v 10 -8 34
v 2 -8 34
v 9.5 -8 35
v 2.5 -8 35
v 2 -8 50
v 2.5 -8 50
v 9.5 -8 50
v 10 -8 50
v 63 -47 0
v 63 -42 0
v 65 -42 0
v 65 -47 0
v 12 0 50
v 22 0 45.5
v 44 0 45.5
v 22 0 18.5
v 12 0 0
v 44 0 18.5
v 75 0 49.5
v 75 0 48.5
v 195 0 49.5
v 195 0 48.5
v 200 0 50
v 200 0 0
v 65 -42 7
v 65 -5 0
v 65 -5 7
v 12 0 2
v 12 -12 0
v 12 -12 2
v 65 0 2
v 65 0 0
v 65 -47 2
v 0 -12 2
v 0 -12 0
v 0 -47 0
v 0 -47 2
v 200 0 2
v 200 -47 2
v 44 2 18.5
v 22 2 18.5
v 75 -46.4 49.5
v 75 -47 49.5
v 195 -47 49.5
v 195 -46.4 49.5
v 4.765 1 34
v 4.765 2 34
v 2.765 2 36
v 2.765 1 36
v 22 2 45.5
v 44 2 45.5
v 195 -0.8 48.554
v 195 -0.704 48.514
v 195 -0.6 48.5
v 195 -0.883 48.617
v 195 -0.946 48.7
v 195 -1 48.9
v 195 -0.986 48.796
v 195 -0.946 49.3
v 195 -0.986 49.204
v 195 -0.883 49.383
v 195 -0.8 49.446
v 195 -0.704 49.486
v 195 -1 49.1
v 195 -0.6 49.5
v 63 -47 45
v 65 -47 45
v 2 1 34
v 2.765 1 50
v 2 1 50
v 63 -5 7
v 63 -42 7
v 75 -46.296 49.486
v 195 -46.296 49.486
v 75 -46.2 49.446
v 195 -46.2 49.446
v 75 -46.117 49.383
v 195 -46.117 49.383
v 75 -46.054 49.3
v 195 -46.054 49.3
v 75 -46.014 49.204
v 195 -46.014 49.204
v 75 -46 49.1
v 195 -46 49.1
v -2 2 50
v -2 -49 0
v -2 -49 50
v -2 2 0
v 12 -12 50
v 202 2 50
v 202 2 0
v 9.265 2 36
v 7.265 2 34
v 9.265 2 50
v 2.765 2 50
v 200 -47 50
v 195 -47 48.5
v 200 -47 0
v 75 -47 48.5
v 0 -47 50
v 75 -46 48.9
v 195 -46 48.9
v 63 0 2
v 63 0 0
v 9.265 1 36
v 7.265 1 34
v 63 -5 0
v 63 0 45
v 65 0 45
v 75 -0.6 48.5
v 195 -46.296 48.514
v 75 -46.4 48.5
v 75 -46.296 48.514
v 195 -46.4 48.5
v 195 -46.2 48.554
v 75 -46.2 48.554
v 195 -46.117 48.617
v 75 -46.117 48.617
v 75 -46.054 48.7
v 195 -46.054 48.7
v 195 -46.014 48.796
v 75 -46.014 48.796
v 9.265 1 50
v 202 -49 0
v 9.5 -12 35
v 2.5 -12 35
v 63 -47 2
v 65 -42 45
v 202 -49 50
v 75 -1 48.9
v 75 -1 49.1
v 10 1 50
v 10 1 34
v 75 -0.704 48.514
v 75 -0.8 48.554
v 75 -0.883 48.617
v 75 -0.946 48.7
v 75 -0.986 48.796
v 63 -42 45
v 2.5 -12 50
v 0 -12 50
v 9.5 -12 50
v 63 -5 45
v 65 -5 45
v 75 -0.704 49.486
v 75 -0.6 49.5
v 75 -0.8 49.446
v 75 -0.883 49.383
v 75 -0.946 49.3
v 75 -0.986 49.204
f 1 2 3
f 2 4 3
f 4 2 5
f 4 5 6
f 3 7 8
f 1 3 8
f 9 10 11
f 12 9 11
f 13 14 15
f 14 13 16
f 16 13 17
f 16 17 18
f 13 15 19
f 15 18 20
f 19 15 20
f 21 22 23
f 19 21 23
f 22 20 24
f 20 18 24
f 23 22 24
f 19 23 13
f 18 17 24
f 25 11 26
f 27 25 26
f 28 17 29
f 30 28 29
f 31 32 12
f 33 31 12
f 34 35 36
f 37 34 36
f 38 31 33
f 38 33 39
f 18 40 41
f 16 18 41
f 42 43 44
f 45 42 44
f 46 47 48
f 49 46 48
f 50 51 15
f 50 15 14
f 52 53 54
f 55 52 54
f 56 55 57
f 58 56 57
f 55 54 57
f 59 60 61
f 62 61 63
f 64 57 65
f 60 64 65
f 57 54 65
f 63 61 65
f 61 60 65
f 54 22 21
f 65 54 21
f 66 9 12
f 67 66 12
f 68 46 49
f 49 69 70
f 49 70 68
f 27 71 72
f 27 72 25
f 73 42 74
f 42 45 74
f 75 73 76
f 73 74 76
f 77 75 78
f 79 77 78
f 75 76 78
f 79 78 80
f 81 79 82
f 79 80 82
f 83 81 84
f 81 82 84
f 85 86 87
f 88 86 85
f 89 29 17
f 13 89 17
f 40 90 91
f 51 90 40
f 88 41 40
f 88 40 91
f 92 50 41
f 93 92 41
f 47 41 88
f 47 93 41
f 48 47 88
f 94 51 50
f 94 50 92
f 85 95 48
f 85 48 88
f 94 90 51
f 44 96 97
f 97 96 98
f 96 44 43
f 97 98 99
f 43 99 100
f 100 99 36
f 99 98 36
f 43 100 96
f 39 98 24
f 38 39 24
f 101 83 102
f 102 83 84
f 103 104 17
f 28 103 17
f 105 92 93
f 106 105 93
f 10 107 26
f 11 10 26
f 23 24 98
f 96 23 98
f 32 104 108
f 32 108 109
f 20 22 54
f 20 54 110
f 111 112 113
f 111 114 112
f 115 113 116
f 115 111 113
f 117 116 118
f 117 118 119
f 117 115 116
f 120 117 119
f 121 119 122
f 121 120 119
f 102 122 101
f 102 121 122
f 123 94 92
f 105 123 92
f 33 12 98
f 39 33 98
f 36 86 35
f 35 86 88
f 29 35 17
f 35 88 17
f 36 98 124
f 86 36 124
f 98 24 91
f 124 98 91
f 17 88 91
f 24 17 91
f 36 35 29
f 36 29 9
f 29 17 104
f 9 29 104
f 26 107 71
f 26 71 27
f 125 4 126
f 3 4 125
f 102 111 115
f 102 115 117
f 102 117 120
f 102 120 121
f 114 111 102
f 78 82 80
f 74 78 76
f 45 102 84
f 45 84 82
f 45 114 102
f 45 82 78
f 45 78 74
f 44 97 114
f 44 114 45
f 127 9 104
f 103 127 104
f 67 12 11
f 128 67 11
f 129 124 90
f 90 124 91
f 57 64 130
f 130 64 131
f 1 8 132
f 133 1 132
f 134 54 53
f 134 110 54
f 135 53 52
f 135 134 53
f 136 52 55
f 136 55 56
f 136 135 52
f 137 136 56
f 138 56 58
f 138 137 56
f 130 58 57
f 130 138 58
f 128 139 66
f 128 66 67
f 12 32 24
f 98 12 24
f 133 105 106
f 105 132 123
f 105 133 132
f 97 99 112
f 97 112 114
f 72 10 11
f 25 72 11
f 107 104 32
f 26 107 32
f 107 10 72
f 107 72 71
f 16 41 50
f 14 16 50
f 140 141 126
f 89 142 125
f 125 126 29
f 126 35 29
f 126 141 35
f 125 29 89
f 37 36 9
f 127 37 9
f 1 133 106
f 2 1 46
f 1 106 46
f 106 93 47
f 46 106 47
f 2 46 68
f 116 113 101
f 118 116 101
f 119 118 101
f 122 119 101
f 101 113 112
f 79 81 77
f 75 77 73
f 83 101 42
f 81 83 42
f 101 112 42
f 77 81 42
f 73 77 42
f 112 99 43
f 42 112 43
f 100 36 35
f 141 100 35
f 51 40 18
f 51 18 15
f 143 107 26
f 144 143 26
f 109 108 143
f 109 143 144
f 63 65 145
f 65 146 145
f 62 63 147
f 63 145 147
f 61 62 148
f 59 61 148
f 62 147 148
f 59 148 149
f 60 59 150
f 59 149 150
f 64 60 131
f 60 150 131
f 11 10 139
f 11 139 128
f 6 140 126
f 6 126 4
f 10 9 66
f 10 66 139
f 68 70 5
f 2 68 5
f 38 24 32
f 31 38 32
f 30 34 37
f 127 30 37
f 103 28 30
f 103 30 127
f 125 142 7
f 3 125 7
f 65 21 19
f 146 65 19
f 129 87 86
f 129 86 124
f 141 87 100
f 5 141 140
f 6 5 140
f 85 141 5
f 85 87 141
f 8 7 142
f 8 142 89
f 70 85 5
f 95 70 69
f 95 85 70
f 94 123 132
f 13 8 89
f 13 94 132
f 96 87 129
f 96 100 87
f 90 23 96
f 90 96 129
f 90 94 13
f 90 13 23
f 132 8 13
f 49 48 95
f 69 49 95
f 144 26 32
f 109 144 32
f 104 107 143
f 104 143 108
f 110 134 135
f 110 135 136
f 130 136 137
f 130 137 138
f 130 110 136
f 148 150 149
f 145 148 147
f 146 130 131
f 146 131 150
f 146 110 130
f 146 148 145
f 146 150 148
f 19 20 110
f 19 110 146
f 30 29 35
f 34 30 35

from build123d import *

# Parameters (mm, degrees)
F1_DEPTH  = 2
F0_W      = 204
F0_H      = 51
F0_W_2    = 12
F0_H_2    = 12
F2_DEPTH  = 50
F0_W_3    = 2
F0_H_3    = 37
F3_DEPTH  = 7
F0_H_4    = 5
F4_DEPTH  = 45
F6_DEPTH  = 16
F5_W      = 7
F5_H      = 4
F7_DEPTH  = 15
F8_W      = 22
F8_H      = 27
F9_DEPTH  = 5
F10_W     = 120
F10_H     = 1
F11_DEPTH = 3
F12_W     = 120
F12_H     = 1
F13_DEPTH = 3
F14_R     = 0.4


# Not quite as in the source:
# - a feature names something its author has since deleted; it is built from what else it names


with BuildPart() as f1:
    # F0 (on Top) → F1 (new body)
    with BuildSketch(Plane.XY):
        Polygon((200, 0), (65, 0), (65, -5), (65, -42), (65, -47), (200, -47), align=None)
    extrude(amount=F1_DEPTH)


with BuildPart() as f1b:
    # F0 (on Top) → F1, piece 2 (new body)
    with BuildSketch(Plane.XY):
        Polygon((63, 0), (12, 0), (12, -12), (0, -12), (0, -47), (63, -47), (63, -42), (63, -5), align=None)
    extrude(amount=F1_DEPTH)


with BuildPart() as f2:
    # F0 (on Top) → F2 (new body)
    with BuildSketch(Plane.XY):
        with Locations((100, -23.5)):
            Rectangle(F0_W, F0_H)
        Polygon((0, -12), (0, 0), (12, 0), (63, 0), (65, 0), (200, 0), (200, -47), (65, -47), (63, -47), (0, -47), align=None, mode=Mode.SUBTRACT)
        with Locations((6, -6)):
            Rectangle(F0_W_2, F0_H_2)
    extrude(amount=F2_DEPTH)

    # F5 (on face) → F6 (cut)
    with BuildSketch(Plane.XY.offset(50)):
        Polygon((9.25, 1), (2.75, 1), (2, 1), (2, -8), (2.5, -8), (9.5, -8), (10, -8), (10, 1), align=None)
    extrude(amount=-F6_DEPTH, mode=Mode.SUBTRACT)

    # F5 (on face) → F7 (cut)
    with BuildSketch(Plane.XY.offset(50)):
        with Locations((6, -10)):
            Rectangle(F5_W, F5_H)
    extrude(amount=-F7_DEPTH, mode=Mode.SUBTRACT)

    # F8 (on face) → F9 (cut)
    with BuildSketch(Plane(origin=(0, 2, 0), x_dir=(-1, 0, 0), z_dir=(0, 1, 0))):
        Polygon((-7.265019957, 34), (-4.765019957, 34), (-2.765019957, 36), (-2.765019957, 50), (-9.265019957, 50), (-9.265019957, 36), align=None)
        with Locations((-33, 32)):
            Rectangle(F8_W, F8_H)
    extrude(amount=-F9_DEPTH, mode=Mode.SUBTRACT)

    # F10 (on face) → F11 (join)
    with BuildSketch(Plane.XZ.offset(49)):
        with Locations((135, 49)):
            Rectangle(F10_W, F10_H)
    extrude(amount=-F11_DEPTH)

    # F12 (on face) → F13 (join)
    with BuildSketch(Plane(origin=(0, 2, 0), x_dir=(-1, 0, 0), z_dir=(0, 1, 0))):
        with Locations((-135, 49)):
            Rectangle(F12_W, F12_H)
    extrude(amount=-F13_DEPTH)

    # F14
    f14_edges = [f2.edges().sort_by_distance(p)[0] for p in [
        (135, -46, 48.5),
        (135, -46, 49.5),
        (135, -1, 49.5),
        (135, -1, 48.5),
    ]]
    fillet(f14_edges, radius=F14_R)


with BuildPart() as f3:
    # F0 (on Top) → F3 (new body)
    with BuildSketch(Plane.XY):
        with Locations((64, -23.5)):
            Rectangle(F0_W_3, F0_H_3)
    extrude(amount=F3_DEPTH)


with BuildPart() as f4:
    # F0 (on Top) → F4 (new body)
    with BuildSketch(Plane.XY):
        with Locations((64, -44.5)):
            Rectangle(F0_W_3, F0_H_4)
    extrude(amount=F4_DEPTH)


with BuildPart() as f4b:
    # F0 (on Top) → F4, piece 2 (new body)
    with BuildSketch(Plane.XY):
        with Locations((64, -2.5)):
            Rectangle(F0_W_3, F0_H_4)
    extrude(amount=F4_DEPTH)


solid = Compound([f1.part, f1b.part, f2.part, f3.part, f4.part, f4b.part])
